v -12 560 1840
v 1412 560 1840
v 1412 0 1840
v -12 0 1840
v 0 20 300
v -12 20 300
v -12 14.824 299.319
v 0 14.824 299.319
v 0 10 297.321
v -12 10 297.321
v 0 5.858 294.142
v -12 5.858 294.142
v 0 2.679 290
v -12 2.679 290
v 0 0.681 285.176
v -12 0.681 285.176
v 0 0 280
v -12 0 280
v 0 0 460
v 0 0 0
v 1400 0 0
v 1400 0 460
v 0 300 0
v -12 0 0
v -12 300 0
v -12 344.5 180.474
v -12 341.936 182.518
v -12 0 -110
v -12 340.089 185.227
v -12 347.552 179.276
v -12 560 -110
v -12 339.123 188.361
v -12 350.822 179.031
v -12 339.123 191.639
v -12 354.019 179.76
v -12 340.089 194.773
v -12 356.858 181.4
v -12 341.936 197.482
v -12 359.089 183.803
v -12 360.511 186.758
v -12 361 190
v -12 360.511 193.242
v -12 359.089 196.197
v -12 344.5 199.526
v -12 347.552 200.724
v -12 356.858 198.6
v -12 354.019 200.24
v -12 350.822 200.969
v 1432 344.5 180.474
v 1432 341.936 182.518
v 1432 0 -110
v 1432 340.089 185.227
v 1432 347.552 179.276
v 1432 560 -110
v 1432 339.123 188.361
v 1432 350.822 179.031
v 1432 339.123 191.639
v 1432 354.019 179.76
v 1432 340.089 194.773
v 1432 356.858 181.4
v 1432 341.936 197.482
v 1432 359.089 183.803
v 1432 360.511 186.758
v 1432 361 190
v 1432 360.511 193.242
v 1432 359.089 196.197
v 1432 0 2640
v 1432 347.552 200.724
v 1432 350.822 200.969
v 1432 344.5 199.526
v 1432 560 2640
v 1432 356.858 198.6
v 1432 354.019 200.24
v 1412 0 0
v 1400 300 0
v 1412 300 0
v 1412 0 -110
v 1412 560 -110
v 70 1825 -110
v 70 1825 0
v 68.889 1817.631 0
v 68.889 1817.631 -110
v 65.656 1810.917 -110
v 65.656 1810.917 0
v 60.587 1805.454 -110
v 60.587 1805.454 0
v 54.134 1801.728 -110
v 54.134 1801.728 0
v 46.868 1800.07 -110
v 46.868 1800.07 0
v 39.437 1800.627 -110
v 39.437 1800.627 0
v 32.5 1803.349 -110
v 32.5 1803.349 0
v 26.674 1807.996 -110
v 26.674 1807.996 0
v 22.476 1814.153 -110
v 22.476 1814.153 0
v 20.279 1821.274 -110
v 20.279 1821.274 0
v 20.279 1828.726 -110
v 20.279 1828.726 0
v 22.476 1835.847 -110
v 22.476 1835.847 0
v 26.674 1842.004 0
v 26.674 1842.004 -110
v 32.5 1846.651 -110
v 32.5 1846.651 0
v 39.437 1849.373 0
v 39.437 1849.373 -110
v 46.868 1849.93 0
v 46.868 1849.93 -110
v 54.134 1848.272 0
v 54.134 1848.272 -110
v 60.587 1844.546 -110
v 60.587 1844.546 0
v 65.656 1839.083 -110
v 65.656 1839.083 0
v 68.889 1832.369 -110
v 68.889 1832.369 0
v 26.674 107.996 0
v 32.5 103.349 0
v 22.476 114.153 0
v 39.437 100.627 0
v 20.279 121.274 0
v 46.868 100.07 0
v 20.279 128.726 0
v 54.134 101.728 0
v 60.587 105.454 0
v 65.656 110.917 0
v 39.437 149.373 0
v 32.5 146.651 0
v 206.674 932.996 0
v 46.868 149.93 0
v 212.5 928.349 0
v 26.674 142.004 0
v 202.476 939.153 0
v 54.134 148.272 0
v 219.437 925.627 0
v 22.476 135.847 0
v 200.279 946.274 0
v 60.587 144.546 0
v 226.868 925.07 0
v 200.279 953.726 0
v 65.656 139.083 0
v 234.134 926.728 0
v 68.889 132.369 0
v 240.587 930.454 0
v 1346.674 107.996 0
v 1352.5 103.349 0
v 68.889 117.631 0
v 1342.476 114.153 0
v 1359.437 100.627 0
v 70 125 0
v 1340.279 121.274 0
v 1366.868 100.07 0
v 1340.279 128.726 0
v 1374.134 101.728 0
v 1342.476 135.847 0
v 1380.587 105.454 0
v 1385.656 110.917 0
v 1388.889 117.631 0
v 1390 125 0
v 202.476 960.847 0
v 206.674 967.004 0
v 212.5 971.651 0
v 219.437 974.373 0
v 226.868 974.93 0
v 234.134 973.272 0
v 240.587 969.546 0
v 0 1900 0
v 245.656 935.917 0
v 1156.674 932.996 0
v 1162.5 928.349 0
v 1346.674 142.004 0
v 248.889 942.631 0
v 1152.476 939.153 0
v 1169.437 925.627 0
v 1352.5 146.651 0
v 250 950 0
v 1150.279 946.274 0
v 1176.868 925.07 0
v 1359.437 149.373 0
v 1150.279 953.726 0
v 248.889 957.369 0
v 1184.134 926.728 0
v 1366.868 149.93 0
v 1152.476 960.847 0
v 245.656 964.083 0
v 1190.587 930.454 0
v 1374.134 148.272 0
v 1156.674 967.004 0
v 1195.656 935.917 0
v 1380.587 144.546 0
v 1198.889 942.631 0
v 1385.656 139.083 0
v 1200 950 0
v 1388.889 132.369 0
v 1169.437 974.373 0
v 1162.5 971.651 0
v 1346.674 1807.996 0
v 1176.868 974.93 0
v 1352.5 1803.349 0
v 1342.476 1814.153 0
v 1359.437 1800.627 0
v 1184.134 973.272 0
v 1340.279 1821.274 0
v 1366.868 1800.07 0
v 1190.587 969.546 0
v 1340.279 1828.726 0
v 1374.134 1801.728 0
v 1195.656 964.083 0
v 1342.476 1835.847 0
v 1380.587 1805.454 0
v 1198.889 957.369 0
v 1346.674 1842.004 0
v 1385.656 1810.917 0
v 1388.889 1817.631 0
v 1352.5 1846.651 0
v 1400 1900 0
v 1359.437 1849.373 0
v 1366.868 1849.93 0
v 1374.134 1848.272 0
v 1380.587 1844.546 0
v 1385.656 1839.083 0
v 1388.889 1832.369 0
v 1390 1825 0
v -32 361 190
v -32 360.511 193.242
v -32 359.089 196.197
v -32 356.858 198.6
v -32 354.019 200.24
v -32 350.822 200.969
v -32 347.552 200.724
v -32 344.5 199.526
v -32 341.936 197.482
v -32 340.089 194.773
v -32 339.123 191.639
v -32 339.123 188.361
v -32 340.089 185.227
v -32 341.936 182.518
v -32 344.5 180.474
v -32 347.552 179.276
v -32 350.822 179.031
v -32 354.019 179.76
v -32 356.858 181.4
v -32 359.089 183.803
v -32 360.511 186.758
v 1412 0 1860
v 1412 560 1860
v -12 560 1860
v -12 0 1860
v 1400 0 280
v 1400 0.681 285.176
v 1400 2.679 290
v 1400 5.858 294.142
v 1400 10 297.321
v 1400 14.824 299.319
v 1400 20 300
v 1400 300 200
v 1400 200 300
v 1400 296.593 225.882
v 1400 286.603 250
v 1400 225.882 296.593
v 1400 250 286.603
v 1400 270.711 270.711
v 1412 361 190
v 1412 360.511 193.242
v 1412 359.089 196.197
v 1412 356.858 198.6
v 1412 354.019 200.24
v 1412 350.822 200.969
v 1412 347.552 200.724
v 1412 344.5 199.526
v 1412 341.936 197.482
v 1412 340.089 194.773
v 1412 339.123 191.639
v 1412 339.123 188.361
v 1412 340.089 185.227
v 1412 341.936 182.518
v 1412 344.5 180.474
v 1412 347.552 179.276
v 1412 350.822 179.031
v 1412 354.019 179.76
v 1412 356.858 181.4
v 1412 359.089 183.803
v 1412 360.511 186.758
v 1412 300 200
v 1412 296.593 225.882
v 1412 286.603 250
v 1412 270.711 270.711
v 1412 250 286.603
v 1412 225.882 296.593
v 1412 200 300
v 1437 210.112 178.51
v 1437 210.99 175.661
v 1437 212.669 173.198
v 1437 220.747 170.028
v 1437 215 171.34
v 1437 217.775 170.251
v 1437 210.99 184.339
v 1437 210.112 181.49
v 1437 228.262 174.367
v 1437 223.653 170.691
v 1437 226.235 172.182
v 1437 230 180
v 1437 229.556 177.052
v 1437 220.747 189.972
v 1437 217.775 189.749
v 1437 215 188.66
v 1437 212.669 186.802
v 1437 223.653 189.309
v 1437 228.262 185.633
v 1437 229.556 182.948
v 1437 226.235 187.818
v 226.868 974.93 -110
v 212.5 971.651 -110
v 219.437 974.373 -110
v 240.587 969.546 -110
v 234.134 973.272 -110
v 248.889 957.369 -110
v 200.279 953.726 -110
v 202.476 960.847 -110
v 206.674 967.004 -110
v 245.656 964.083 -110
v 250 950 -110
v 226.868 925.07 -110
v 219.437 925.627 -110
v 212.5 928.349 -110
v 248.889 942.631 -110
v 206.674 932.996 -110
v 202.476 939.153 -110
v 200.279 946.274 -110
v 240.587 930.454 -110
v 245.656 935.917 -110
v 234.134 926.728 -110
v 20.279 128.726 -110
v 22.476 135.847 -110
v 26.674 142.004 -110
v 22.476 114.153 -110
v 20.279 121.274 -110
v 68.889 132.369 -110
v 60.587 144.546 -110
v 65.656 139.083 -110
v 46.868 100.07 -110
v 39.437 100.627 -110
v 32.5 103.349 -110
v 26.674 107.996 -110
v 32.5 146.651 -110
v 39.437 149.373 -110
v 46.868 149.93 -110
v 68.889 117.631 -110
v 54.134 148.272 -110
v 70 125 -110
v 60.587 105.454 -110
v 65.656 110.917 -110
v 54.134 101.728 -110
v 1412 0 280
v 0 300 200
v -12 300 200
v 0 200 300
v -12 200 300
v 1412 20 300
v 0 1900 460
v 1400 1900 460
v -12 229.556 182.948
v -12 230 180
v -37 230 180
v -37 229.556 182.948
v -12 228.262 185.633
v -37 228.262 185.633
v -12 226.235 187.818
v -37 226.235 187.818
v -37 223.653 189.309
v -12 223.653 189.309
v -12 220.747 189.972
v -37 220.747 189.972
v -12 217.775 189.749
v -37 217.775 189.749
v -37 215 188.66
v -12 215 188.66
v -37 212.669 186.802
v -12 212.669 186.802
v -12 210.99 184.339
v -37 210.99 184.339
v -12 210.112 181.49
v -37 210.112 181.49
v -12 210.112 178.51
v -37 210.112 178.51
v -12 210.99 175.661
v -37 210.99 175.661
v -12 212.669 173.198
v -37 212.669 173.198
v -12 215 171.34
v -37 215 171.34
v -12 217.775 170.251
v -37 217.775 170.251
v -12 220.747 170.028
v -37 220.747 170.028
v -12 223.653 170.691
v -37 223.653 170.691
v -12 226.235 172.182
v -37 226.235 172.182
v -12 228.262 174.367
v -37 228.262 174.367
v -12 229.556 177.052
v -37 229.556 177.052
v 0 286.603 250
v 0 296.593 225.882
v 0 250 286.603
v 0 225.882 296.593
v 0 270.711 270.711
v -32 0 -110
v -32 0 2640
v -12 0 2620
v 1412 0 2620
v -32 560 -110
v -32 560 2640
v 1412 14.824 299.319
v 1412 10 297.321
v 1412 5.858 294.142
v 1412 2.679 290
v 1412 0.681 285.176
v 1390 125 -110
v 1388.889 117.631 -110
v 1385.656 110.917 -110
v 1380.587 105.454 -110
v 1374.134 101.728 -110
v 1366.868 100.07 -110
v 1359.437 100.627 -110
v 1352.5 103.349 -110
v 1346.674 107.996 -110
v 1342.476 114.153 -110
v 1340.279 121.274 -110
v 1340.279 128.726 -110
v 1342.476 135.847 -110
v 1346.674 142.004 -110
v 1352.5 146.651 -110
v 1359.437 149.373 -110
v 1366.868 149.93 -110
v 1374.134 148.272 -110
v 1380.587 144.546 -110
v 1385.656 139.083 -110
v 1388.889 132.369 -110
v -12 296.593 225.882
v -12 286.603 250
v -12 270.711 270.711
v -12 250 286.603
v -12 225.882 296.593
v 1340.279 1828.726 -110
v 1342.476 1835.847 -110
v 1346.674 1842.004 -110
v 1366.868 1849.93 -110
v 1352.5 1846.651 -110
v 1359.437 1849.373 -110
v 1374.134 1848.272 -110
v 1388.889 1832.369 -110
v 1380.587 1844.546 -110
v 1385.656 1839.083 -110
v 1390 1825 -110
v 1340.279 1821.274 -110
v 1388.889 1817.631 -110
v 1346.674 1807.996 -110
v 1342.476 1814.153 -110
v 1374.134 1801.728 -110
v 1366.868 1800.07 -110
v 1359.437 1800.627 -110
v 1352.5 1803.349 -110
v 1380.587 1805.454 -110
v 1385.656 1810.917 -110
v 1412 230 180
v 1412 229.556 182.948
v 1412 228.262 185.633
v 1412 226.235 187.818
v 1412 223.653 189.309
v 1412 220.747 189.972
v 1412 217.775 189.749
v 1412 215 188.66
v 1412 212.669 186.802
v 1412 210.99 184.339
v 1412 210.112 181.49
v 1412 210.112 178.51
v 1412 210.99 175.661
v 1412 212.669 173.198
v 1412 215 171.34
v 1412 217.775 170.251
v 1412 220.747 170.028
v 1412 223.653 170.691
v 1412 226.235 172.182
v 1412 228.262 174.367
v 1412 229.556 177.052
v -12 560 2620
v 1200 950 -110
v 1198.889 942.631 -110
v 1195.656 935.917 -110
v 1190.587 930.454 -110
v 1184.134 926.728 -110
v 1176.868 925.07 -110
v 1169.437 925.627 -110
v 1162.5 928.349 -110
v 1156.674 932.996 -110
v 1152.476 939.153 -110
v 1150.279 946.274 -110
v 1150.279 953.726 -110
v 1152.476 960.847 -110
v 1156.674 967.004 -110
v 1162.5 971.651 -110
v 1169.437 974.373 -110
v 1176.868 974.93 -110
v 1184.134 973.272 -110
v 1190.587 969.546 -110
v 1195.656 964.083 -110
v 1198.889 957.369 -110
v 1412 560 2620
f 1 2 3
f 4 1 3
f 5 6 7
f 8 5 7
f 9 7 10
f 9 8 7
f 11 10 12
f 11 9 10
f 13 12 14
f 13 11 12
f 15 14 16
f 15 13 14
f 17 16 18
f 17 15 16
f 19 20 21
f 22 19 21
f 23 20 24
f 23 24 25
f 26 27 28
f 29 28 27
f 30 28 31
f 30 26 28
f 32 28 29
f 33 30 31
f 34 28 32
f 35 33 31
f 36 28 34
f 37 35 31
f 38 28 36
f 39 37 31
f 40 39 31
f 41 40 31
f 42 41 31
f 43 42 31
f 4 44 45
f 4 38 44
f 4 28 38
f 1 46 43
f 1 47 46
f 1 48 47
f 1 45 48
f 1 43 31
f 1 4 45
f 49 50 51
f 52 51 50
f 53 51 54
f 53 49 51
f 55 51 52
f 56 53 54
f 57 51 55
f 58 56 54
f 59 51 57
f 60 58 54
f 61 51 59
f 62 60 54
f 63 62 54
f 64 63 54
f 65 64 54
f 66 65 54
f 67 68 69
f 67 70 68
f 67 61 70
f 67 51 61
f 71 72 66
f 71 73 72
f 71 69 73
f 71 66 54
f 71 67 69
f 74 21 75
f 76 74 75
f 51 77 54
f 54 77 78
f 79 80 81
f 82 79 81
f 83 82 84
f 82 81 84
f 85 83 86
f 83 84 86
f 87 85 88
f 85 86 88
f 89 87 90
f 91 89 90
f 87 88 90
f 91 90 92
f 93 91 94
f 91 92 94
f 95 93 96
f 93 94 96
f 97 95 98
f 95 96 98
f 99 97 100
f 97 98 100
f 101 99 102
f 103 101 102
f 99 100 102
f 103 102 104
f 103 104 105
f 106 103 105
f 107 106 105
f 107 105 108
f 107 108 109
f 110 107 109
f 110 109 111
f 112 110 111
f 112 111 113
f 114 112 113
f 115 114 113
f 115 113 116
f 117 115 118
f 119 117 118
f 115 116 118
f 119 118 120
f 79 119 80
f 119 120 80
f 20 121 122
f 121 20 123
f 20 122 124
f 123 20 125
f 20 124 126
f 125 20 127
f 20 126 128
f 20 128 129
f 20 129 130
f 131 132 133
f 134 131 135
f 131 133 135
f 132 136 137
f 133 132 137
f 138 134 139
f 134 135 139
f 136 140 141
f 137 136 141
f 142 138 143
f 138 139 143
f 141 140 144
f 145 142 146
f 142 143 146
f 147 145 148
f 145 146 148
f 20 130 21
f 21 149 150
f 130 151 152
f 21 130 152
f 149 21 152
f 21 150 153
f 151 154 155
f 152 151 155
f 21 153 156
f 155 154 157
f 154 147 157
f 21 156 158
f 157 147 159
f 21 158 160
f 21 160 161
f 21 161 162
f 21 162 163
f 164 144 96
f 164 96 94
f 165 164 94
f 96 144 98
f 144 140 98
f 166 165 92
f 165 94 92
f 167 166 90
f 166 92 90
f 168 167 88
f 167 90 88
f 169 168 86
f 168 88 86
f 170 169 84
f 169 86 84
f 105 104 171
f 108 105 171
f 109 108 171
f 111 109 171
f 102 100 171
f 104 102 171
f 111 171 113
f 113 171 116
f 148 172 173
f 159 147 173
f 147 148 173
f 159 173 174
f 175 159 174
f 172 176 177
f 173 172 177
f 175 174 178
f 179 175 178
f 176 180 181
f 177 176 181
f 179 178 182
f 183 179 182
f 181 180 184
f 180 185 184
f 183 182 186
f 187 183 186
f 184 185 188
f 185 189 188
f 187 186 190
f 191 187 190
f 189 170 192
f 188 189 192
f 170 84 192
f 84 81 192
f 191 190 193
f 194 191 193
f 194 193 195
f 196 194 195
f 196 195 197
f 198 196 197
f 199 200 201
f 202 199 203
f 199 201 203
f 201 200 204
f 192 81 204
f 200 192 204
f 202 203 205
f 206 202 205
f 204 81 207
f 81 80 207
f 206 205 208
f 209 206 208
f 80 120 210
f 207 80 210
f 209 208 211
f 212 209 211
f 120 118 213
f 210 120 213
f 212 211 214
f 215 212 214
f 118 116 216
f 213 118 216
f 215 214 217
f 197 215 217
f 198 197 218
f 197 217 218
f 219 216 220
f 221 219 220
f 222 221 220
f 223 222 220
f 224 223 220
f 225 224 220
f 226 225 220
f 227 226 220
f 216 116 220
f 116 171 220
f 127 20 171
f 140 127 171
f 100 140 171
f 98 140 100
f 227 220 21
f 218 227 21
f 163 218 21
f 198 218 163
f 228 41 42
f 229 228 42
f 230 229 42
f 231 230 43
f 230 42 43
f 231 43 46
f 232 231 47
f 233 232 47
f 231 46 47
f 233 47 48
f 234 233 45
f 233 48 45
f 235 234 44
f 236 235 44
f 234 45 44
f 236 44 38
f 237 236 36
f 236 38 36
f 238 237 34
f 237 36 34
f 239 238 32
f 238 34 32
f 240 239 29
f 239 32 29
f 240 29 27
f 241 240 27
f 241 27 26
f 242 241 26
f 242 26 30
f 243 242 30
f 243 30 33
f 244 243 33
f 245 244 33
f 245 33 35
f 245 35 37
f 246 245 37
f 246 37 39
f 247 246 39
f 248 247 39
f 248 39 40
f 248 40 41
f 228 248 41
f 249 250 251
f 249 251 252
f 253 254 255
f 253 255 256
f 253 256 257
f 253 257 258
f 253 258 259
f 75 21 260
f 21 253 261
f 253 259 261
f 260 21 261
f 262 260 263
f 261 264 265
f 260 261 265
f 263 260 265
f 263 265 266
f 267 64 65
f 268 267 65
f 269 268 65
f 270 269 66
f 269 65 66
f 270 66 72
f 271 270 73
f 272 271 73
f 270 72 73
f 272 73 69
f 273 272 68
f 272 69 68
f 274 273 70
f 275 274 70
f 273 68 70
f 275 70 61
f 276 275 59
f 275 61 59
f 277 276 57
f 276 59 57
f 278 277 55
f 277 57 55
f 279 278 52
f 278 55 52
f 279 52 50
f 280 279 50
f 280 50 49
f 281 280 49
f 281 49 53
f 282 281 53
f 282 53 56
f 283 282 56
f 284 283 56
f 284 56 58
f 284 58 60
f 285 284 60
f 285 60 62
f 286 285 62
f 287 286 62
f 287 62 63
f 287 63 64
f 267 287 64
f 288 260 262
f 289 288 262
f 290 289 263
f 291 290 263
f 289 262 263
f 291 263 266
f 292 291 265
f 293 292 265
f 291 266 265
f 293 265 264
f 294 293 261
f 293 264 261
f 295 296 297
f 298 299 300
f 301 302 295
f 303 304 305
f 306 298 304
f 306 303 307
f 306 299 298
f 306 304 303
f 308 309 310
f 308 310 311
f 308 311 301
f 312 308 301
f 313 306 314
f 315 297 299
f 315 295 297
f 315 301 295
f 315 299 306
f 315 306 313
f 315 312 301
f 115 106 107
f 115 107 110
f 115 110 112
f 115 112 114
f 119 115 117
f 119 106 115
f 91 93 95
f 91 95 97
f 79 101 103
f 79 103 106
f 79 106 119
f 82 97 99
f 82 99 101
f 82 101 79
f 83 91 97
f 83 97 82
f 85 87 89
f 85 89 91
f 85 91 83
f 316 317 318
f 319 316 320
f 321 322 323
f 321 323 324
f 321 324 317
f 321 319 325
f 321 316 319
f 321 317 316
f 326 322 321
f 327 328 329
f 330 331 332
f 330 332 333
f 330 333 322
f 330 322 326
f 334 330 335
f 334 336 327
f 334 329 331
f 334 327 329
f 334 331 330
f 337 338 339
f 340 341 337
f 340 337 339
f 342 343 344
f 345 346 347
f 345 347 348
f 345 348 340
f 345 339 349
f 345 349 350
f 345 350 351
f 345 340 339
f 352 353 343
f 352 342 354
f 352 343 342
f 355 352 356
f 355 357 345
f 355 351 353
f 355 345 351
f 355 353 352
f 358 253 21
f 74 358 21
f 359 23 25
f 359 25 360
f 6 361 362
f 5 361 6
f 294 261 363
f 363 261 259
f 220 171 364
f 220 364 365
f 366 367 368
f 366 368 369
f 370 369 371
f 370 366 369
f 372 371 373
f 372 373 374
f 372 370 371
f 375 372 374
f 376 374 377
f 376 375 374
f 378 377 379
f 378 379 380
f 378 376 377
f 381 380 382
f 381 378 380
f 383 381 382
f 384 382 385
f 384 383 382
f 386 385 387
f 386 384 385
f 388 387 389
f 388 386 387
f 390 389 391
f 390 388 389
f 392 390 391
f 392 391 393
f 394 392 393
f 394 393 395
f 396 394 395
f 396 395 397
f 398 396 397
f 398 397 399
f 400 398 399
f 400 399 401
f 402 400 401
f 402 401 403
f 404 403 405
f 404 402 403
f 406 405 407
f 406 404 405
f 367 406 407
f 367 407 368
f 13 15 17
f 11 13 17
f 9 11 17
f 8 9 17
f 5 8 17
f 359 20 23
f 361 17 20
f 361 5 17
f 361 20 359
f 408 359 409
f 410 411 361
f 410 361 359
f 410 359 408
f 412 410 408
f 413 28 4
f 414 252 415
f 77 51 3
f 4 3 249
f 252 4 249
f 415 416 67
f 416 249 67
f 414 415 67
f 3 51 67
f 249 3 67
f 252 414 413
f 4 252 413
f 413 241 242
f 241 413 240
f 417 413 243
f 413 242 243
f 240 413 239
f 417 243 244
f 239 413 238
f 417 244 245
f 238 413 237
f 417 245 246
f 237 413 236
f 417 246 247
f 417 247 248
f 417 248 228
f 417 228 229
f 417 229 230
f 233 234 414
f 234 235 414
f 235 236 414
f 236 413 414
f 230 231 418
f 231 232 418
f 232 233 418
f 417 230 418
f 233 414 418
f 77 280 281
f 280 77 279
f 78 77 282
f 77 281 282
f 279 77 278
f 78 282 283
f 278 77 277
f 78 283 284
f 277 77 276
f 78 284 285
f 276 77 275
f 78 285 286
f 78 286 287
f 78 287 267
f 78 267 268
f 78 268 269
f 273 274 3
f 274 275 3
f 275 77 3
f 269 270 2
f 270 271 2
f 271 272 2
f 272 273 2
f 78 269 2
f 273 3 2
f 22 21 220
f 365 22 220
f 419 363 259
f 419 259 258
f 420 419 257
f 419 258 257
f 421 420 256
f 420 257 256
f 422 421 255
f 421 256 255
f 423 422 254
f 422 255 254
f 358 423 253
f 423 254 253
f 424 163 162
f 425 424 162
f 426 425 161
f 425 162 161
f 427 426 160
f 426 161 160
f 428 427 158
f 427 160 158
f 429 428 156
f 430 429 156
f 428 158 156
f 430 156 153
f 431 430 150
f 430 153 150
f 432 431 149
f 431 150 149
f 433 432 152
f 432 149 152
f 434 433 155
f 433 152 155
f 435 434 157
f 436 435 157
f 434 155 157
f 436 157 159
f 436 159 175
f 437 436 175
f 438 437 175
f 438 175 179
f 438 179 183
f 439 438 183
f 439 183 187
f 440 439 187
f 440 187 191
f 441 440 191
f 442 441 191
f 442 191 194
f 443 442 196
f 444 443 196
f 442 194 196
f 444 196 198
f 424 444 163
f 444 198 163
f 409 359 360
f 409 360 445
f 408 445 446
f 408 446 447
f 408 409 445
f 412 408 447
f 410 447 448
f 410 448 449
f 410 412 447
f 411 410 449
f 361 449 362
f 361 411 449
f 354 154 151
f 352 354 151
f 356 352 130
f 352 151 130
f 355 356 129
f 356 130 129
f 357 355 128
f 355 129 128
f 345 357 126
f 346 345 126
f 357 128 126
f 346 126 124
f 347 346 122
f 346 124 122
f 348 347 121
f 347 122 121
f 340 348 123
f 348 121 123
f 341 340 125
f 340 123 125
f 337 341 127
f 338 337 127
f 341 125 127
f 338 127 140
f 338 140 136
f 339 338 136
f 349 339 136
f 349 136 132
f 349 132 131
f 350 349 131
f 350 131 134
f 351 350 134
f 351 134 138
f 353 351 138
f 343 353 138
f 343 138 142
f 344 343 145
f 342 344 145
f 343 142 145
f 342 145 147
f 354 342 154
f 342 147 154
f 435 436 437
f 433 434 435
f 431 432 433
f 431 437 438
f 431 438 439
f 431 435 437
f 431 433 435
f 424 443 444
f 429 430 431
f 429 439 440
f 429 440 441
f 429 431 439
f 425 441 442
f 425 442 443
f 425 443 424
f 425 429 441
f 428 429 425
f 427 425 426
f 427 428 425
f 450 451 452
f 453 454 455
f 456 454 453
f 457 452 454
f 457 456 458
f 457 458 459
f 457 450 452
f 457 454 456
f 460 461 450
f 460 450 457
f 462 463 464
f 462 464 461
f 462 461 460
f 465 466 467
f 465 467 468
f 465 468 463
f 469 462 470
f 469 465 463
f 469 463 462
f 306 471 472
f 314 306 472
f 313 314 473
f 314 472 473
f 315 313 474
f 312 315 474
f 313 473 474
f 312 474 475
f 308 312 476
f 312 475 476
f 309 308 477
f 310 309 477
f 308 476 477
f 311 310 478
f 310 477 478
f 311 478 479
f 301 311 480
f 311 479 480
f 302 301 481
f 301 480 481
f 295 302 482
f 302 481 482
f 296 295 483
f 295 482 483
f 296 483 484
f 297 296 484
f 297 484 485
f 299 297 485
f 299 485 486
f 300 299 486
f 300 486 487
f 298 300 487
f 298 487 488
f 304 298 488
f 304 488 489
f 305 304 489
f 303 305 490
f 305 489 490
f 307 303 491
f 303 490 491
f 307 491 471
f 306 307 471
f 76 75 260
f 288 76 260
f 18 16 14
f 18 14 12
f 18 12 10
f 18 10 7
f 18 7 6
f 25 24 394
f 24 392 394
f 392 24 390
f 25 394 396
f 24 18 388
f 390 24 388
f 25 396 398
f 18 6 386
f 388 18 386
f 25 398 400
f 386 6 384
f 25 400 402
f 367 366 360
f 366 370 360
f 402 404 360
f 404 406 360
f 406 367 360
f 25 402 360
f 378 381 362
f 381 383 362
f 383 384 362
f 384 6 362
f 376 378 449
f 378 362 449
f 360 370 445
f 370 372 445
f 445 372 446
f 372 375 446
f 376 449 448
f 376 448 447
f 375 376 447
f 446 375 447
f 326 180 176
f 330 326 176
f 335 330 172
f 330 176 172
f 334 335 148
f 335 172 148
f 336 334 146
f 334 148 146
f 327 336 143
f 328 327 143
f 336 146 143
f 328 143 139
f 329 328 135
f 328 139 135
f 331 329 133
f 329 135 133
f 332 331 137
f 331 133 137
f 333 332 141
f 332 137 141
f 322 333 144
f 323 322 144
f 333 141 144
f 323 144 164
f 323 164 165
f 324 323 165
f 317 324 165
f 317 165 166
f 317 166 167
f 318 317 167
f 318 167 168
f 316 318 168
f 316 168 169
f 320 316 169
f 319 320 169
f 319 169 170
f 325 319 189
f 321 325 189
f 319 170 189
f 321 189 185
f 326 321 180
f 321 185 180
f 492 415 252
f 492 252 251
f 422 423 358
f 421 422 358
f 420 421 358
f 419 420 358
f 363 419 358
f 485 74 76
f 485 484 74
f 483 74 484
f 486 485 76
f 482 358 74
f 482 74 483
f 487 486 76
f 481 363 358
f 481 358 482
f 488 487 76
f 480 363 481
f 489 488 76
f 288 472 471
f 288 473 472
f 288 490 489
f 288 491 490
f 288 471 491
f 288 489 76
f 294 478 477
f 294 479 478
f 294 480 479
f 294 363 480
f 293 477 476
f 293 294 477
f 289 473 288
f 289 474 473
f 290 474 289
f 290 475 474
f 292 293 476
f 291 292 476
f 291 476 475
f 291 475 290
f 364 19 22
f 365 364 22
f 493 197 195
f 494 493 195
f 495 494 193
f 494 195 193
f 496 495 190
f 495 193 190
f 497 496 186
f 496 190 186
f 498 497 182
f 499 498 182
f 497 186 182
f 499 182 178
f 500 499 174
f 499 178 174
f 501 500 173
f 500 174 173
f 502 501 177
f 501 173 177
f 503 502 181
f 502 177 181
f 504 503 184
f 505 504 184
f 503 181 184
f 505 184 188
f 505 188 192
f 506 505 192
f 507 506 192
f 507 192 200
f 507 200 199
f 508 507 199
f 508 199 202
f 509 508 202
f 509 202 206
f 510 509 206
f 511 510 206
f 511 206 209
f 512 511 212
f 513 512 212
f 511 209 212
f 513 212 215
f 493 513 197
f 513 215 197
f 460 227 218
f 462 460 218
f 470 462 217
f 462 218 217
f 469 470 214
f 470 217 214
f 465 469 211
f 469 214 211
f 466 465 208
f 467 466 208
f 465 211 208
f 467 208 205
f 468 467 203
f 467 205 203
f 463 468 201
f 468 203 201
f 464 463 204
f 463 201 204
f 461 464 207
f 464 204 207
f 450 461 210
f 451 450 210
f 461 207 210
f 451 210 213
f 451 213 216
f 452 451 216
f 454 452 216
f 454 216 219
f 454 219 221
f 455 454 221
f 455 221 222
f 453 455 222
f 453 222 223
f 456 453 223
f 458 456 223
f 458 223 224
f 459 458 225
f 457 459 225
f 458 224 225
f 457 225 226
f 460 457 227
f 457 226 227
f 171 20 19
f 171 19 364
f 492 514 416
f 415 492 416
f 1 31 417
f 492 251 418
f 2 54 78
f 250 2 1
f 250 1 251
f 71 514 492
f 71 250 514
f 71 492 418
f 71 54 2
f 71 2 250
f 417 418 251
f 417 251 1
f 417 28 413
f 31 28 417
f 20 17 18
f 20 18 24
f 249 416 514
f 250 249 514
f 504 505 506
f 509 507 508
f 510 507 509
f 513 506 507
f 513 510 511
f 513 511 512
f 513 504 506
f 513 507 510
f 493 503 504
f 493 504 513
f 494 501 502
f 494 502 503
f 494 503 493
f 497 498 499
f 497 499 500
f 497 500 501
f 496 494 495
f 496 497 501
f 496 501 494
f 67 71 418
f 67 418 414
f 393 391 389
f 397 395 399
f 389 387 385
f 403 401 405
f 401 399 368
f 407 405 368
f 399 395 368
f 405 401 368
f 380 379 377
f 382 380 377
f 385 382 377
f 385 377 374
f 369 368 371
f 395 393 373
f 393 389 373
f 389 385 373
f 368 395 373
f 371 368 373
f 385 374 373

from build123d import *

# Parameters (mm, degrees)
F0_W      = 1400
F0_H      = 1900
F1_DEPTH  = 460
F2_R      = 25
F3_DEPTH  = 110
F5_DEPTH  = 12
F6_R      = 10
F7_DEPTH  = 25
F10_W     = 560
F10_H     = 2750
F11_DEPTH = 20
F12_W     = 560
F12_H     = 20
F13_DEPTH = 1440
F15_R     = 11
F16_DEPTH = 1469.001


with BuildPart() as f1:
    # F0 (on Top) → F1 (new body)
    with BuildSketch(Plane.XY):
        with Locations((700, 950)):
            Rectangle(F0_W, F0_H)
    extrude(amount=F1_DEPTH)

    # F2 (on face) → F3 (join)
    with BuildSketch(Plane(origin=(0, 0, 0), x_dir=(1, 0, 0), z_dir=(0, 0, -1))):
        with Locations((45, -125)):
            Circle(F2_R)
        with Locations((45, -1825)):
            Circle(F2_R)
        with Locations((1365, -125)):
            Circle(F2_R)
        with Locations((1365, -1825)):
            Circle(F2_R)
        with Locations((225, -950)):
            Circle(F2_R)
        with Locations((1175, -950)):
            Circle(F2_R)
    extrude(amount=F3_DEPTH)


with BuildPart() as f5:
    # F4 (on face) → F5 (new body)
    with BuildSketch(Plane.YZ.offset(1400)):
        with BuildLine():
            Line((200, 300), (20, 300))
            ThreePointArc((20, 300), (5.8578643763, 294.1421356237), (0, 280))
            Line((0, 280), (0, 0))
            Line((0, 0), (300, 0))
            Line((300, 0), (300, 200))
            ThreePointArc((300, 200), (270.7106781187, 270.7106781187), (200, 300))
        make_face()
    extrude(amount=F5_DEPTH)

    # F6 (on face) → F7 (join)
    with BuildSketch(Plane.YZ.offset(1412)):
        with Locations((220, 180)):
            Circle(F6_R)
    extrude(amount=F7_DEPTH)


with BuildPart() as f9_1:
    # F9: instance of F5
    add(f5.part.mirror(Plane.YZ.offset(700)))


with BuildPart() as f11:
    # F10 (on face) → F11 (new body)
    with BuildSketch(Plane.YZ.offset(1412)):
        with Locations((280, 1265)):
            Rectangle(F10_W, F10_H)
    extrude(amount=F11_DEPTH)

    # F12 (on face) → F13 (join)
    with BuildSketch(Plane(origin=(1412, 0, 0), x_dir=(0, -1, 0), z_dir=(-1, 0, 0))):
        with Locations((-280, 2630)):
            Rectangle(F12_W, F12_H)
        with Locations((-280, 1850)):
            Rectangle(F12_W, F12_H)
    extrude(amount=F13_DEPTH)

    # F14: F11 across plane


with BuildPart() as f11_1:
    add(f11.part)
    add(f11.part.mirror(Plane.YZ.offset(700)))

    # F15 (on face) → F16 (cut, through all)
    with BuildSketch(Plane.YZ.offset(1432)):
        with Locations((350, 190)):
            Circle(F15_R)
    extrude(amount=-F16_DEPTH, mode=Mode.SUBTRACT)


solid = Compound([f1.part, f5.part, f9_1.part, f11_1.part])
